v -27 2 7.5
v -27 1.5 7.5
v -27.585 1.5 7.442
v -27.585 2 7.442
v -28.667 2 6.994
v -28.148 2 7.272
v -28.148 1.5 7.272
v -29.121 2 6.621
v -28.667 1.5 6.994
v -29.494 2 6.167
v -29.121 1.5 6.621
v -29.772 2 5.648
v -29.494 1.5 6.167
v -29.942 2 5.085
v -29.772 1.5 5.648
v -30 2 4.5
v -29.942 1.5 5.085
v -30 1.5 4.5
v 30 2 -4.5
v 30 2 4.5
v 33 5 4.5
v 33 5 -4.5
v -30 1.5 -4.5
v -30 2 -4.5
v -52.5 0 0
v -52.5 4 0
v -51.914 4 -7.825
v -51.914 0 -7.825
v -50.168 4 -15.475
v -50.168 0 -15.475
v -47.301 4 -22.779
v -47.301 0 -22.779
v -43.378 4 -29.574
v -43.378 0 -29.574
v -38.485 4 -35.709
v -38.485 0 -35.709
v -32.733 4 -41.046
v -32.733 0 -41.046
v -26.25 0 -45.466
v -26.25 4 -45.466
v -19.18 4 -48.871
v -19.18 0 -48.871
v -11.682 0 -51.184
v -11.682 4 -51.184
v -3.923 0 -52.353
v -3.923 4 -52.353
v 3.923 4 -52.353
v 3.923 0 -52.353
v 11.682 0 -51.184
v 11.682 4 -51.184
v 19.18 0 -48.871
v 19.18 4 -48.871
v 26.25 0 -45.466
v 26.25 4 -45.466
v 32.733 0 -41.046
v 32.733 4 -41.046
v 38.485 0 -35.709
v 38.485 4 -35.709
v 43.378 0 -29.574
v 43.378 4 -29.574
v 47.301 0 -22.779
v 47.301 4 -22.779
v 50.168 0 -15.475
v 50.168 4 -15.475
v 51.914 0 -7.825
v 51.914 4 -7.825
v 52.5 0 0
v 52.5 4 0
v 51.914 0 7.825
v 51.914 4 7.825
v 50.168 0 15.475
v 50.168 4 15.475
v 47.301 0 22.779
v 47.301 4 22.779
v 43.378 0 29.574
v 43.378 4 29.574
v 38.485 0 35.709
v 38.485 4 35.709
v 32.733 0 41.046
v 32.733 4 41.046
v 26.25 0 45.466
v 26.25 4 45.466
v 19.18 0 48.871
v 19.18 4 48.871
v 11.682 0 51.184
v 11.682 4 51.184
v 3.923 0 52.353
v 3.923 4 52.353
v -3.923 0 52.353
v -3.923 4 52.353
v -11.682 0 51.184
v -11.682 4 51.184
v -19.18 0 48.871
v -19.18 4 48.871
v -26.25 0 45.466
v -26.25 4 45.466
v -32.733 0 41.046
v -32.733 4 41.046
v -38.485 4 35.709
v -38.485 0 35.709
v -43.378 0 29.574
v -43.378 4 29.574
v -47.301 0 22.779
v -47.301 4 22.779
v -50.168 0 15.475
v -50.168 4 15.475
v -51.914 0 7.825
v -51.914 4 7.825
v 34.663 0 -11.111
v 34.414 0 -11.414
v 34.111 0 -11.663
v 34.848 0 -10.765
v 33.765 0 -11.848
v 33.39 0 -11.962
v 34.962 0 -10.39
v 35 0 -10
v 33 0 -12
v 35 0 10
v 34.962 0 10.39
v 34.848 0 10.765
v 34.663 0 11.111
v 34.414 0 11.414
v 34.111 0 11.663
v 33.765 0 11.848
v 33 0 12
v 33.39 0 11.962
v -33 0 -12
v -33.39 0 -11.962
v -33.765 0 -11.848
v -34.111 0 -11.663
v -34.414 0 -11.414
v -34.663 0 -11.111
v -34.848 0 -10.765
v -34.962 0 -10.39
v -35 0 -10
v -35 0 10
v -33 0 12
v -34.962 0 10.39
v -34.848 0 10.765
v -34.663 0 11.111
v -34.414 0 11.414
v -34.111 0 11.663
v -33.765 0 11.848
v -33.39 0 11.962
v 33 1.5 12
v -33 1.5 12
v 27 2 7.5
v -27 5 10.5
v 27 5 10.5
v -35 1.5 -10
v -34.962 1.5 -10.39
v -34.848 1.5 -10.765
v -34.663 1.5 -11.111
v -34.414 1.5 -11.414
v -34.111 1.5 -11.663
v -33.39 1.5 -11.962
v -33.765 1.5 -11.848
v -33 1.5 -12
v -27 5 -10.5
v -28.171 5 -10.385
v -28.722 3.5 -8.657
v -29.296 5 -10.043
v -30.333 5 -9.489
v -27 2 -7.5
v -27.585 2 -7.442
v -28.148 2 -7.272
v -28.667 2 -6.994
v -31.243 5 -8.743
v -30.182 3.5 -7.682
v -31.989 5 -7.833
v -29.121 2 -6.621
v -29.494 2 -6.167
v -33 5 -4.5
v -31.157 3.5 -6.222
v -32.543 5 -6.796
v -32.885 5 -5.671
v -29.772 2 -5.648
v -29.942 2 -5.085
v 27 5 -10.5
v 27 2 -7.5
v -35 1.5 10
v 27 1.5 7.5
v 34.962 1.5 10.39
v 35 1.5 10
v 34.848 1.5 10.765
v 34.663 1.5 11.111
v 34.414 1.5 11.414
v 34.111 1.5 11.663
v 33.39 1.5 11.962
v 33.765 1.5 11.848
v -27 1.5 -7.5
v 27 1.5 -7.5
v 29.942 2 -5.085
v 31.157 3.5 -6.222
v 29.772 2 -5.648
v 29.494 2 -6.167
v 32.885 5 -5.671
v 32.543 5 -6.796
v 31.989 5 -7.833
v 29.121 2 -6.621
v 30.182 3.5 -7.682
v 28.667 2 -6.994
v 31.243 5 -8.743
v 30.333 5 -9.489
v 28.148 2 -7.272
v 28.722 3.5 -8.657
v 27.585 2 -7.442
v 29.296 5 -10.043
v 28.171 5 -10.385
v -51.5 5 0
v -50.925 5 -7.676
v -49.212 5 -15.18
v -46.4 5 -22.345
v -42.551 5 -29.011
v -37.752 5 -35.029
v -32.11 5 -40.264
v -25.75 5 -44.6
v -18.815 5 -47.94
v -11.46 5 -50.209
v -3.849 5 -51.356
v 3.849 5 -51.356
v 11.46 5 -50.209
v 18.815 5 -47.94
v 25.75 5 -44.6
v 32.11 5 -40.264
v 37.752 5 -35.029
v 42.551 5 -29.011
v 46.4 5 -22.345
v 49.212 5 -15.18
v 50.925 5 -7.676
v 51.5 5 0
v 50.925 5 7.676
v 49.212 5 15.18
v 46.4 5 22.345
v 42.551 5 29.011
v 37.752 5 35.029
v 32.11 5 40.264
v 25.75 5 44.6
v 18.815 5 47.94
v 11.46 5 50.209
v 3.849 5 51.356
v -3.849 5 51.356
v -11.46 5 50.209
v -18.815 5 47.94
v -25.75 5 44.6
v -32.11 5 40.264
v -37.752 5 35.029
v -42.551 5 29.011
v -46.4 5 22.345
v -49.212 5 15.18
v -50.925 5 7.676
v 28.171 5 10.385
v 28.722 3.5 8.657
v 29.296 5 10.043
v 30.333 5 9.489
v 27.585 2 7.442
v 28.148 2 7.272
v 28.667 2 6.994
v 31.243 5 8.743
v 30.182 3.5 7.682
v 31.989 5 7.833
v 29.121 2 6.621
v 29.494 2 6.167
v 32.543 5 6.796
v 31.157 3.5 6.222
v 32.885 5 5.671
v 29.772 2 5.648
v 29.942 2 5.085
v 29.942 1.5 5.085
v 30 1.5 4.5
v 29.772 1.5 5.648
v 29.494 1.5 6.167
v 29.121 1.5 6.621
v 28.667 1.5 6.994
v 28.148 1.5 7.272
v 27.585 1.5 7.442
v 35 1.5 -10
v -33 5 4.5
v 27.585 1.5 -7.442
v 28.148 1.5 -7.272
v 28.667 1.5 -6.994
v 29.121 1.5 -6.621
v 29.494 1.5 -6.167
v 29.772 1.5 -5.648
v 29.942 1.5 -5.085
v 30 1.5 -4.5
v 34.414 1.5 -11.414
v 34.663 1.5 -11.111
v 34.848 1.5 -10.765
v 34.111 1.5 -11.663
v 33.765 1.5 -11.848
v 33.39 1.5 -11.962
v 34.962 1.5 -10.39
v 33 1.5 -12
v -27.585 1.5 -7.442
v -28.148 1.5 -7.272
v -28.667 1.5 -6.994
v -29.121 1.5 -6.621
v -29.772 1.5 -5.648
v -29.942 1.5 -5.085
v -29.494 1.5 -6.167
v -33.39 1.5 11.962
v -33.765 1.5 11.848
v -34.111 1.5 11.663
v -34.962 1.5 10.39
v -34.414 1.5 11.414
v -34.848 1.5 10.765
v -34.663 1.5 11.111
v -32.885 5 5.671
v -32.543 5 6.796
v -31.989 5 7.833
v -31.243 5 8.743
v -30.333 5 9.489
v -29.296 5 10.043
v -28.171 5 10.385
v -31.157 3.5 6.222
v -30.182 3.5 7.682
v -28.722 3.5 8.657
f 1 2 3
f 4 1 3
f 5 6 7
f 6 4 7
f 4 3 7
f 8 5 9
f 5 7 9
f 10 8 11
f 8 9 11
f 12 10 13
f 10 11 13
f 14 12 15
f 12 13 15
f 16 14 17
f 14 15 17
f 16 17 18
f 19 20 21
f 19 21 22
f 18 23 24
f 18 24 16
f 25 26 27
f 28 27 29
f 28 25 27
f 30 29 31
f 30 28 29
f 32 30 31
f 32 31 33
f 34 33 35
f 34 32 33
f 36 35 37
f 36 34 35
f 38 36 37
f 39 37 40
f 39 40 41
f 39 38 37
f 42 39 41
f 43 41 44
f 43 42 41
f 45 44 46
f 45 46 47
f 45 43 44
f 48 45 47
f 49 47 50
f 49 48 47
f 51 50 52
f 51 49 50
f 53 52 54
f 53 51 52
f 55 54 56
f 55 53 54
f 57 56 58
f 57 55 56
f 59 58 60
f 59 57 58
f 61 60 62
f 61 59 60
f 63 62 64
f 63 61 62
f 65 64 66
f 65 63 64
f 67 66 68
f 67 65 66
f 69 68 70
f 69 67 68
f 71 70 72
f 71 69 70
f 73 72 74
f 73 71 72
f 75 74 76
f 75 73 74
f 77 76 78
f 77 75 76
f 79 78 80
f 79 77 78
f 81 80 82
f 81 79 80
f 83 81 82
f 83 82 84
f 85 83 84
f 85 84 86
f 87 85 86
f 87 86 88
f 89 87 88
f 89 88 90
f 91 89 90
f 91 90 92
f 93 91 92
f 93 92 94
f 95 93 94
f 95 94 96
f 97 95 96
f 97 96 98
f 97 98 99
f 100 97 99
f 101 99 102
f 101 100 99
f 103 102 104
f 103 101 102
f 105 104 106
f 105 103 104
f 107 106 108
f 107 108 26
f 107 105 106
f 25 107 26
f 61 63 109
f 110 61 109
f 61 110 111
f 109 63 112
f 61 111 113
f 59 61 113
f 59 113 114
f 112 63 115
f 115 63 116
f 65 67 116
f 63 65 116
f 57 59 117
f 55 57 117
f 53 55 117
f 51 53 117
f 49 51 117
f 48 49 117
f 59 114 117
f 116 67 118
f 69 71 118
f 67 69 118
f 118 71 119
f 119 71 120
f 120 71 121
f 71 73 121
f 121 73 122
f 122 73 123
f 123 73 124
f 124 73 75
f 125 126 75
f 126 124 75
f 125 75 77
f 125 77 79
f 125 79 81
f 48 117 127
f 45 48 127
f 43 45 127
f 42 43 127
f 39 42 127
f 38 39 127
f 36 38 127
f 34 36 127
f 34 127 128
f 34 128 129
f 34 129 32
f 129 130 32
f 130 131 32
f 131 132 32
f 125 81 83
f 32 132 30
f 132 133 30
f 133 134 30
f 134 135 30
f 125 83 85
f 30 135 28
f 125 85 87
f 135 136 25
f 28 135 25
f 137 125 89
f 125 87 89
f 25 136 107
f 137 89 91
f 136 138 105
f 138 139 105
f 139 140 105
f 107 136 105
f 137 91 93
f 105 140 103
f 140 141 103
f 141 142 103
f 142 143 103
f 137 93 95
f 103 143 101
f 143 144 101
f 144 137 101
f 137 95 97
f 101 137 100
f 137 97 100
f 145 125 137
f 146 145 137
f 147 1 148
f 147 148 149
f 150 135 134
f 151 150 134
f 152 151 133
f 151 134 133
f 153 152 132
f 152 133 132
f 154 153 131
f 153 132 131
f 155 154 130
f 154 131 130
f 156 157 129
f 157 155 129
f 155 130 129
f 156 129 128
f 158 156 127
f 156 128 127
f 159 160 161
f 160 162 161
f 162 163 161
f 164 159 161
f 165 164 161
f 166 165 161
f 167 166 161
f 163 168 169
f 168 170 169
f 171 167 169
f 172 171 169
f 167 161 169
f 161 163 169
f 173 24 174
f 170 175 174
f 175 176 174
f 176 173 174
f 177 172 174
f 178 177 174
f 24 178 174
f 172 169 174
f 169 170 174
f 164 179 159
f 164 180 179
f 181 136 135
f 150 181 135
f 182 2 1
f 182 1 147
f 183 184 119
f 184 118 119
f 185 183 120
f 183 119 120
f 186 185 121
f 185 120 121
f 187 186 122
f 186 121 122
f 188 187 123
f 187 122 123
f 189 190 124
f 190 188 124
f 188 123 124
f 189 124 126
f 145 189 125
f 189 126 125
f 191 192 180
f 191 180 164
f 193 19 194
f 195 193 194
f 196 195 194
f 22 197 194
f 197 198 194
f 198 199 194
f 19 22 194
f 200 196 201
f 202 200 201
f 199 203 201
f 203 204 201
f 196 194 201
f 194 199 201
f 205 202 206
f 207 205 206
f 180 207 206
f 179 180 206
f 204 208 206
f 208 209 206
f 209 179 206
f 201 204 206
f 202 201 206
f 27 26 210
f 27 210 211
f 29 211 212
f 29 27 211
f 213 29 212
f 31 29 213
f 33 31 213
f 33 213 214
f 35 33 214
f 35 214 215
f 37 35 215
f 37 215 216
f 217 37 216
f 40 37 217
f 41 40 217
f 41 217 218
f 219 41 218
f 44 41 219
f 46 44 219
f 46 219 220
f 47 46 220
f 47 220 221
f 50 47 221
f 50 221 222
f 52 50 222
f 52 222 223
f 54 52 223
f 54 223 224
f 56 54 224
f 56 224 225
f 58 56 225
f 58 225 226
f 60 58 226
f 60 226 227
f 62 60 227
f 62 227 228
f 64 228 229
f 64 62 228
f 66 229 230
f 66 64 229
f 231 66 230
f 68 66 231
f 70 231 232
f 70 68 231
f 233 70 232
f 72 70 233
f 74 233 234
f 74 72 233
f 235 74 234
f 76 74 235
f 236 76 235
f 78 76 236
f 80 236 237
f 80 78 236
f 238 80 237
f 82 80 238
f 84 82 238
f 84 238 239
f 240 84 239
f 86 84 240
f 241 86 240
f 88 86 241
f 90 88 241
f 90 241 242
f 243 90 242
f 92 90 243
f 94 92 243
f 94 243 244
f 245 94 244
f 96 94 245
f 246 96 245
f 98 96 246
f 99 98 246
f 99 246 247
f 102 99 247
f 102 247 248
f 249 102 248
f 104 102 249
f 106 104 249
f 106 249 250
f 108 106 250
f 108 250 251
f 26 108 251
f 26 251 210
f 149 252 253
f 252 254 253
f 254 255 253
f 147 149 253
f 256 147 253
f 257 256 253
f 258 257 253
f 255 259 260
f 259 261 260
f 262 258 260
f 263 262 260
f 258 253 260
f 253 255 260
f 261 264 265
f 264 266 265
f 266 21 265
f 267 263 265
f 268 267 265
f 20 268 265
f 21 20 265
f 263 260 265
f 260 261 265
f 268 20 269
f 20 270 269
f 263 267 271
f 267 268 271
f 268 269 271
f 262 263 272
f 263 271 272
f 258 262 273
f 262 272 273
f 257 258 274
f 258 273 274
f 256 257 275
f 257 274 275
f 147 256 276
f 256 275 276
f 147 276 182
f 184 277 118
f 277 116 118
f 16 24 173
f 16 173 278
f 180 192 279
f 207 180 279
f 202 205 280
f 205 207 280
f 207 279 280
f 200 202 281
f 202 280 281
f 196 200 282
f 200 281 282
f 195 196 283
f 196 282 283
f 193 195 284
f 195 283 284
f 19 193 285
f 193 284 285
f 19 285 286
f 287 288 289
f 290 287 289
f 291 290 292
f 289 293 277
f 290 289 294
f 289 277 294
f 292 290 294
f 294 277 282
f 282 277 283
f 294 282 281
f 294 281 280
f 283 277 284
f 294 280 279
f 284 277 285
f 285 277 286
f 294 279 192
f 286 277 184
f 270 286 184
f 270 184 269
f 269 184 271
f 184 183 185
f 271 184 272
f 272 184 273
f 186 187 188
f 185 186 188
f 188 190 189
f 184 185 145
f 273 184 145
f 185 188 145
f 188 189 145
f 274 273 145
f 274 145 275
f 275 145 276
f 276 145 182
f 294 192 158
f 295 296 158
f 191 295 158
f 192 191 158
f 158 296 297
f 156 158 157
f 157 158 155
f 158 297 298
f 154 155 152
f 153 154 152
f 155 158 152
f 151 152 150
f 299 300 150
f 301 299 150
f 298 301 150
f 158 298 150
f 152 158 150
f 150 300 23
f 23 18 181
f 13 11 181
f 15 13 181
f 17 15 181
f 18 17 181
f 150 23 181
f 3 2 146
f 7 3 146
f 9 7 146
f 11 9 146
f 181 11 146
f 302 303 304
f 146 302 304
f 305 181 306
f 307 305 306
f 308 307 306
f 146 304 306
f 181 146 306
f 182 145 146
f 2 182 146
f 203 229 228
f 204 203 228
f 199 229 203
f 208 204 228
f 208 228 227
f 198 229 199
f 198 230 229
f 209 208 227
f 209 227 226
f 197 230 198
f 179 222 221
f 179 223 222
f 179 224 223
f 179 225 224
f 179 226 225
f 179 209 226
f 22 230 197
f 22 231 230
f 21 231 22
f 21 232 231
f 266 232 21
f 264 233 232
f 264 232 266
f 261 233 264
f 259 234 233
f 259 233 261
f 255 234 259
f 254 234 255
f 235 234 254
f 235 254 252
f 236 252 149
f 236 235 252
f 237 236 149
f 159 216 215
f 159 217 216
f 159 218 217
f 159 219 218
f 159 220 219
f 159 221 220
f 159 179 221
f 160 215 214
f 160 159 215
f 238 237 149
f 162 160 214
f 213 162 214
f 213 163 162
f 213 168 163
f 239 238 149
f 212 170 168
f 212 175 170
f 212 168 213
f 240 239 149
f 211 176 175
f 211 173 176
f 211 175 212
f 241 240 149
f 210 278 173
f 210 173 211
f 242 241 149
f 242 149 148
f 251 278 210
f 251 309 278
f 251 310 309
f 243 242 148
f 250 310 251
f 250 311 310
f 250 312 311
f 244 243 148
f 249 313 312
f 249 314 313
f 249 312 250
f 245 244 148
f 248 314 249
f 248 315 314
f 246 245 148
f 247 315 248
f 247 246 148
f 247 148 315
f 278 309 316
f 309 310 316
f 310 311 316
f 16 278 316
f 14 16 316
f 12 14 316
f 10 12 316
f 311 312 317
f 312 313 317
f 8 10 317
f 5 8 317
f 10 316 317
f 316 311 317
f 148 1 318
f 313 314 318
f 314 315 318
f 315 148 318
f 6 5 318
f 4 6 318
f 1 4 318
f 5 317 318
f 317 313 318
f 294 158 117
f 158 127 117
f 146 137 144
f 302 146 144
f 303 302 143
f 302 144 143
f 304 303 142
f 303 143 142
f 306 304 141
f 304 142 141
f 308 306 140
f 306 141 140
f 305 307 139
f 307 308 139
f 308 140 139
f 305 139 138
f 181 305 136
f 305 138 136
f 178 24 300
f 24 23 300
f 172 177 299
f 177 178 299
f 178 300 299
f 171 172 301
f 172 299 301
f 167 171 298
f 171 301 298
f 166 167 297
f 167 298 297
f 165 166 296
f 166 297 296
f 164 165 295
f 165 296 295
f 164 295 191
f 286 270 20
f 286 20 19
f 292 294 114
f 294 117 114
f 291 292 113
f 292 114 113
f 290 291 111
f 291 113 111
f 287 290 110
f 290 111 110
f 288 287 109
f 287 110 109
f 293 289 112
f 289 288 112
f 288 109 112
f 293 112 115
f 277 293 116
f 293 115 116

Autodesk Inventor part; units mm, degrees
ref_plane "YZ Plane" through (0, 0, 0) normal (1, 0, 0) x (0, 1, 0)
ref_plane "XZ Plane" through (0, 0, 0) normal (0, 1, 0) x (-1, 0, 0)
sketch "Эскиз1" plane through (0, 0, 0) normal (0, 1, 0) x (-1, 0, 0)
  circle A0 centre (0, 0) radius 52.5
  line L0 (89.6506, 0) -> (-102.8587, 0)
  line L1 (-27, -7.5) -> (27, -7.5)
  line L2 (30, -4.5) -> (30, 4.5)
  line L3 (27, 7.5) -> (-27, 7.5)
  line L4 (-30, 4.5) -> (-30, -4.5)
  line L5 (-30, -7.5) -> (30, 7.5) construction
  line L6 (30, -7.5) -> (-30, 7.5) construction
  arc A1 (30, 4.5) -> (27, 7.5) centre (27, 4.5) ccw
  arc A2 (27, -7.5) -> (30, -4.5) centre (27, -4.5) ccw
  arc A3 (-27, 7.5) -> (-30, 4.5) centre (-27, 4.5) ccw
  arc A4 (-30, -4.5) -> (-27, -7.5) centre (-27, -4.5) ccw
  line L7 (33, -12) -> (-33, -12)
  line L8 (-35, -10) -> (-35, 10)
  line L9 (-33, 12) -> (33, 12)
  line L10 (35, 10) -> (35, -10)
  line L11 (35, -12) -> (-32.3514, 11.0919) construction
  line L12 (-35, -12) -> (35, 12) construction
  arc A5 (-33, 12) -> (-35, 10) centre (-33, 10) ccw
  arc A6 (-35, -10) -> (-33, -12) centre (-33, -10) ccw
  arc A7 (33, -12) -> (35, -10) centre (33, -10) ccw
  arc A8 (35, 10) -> (33, 12) centre (33, 10) ccw
  point P0 (-35, 12)
  dimension "d0" = 105
  dimension "d1" = 60
  dimension "d2" = 15
  dimension "d3" = 3
  dimension "d4" = 3
  dimension "d13" = 70
  dimension "d14" = 24
  dimension "d15" = 2
extrude "Выдавливание1" add sketch "Эскиз1" along normal blind 5 contours L0 L10 A8 L9 A5 L8 A0 | A0 L0 L8 A6 L7 A7 L10 | L10 A7 L7 A6 L8 L0 L4 A4 L1 A2 L2 | L0 L2 A1 L3 A3 L4 L8 A5 L9 A8 L10
chamfer "Фаска1" distance 3 angle 45 8 edges at (0, 5, 7.5) (-29.1213, 5, 6.6213) (-30, 5, 0) (-29.1213, 5, -6.6213) (0, 5, -7.5) (29.1213, 5, -6.6213) (30, 5, 0) (29.1213, 5, 6.6213)
chamfer "Фаска2" distance 1 angle 45 1 edges at (52.5, 5, 0)
extrude "Выдавливание2" cut sketch "Эскиз1" along normal blind 1.5 contours L10 A7 L7 A6 L8 L0 L4 A4 L1 A2 L2 | L0 L2 A1 L3 A3 L4 L8 A5 L9 A8 L10 | L2 A2 L1 A4 L4 L0 | L0 L4 A3 L3 A1 L2
ref_plane "РабПлоскость1" through (0, 2.5, 0) normal (0, -1, 0) x (1, 0, 0)
properties part number "фланец2" material "Термопластическая смола"
